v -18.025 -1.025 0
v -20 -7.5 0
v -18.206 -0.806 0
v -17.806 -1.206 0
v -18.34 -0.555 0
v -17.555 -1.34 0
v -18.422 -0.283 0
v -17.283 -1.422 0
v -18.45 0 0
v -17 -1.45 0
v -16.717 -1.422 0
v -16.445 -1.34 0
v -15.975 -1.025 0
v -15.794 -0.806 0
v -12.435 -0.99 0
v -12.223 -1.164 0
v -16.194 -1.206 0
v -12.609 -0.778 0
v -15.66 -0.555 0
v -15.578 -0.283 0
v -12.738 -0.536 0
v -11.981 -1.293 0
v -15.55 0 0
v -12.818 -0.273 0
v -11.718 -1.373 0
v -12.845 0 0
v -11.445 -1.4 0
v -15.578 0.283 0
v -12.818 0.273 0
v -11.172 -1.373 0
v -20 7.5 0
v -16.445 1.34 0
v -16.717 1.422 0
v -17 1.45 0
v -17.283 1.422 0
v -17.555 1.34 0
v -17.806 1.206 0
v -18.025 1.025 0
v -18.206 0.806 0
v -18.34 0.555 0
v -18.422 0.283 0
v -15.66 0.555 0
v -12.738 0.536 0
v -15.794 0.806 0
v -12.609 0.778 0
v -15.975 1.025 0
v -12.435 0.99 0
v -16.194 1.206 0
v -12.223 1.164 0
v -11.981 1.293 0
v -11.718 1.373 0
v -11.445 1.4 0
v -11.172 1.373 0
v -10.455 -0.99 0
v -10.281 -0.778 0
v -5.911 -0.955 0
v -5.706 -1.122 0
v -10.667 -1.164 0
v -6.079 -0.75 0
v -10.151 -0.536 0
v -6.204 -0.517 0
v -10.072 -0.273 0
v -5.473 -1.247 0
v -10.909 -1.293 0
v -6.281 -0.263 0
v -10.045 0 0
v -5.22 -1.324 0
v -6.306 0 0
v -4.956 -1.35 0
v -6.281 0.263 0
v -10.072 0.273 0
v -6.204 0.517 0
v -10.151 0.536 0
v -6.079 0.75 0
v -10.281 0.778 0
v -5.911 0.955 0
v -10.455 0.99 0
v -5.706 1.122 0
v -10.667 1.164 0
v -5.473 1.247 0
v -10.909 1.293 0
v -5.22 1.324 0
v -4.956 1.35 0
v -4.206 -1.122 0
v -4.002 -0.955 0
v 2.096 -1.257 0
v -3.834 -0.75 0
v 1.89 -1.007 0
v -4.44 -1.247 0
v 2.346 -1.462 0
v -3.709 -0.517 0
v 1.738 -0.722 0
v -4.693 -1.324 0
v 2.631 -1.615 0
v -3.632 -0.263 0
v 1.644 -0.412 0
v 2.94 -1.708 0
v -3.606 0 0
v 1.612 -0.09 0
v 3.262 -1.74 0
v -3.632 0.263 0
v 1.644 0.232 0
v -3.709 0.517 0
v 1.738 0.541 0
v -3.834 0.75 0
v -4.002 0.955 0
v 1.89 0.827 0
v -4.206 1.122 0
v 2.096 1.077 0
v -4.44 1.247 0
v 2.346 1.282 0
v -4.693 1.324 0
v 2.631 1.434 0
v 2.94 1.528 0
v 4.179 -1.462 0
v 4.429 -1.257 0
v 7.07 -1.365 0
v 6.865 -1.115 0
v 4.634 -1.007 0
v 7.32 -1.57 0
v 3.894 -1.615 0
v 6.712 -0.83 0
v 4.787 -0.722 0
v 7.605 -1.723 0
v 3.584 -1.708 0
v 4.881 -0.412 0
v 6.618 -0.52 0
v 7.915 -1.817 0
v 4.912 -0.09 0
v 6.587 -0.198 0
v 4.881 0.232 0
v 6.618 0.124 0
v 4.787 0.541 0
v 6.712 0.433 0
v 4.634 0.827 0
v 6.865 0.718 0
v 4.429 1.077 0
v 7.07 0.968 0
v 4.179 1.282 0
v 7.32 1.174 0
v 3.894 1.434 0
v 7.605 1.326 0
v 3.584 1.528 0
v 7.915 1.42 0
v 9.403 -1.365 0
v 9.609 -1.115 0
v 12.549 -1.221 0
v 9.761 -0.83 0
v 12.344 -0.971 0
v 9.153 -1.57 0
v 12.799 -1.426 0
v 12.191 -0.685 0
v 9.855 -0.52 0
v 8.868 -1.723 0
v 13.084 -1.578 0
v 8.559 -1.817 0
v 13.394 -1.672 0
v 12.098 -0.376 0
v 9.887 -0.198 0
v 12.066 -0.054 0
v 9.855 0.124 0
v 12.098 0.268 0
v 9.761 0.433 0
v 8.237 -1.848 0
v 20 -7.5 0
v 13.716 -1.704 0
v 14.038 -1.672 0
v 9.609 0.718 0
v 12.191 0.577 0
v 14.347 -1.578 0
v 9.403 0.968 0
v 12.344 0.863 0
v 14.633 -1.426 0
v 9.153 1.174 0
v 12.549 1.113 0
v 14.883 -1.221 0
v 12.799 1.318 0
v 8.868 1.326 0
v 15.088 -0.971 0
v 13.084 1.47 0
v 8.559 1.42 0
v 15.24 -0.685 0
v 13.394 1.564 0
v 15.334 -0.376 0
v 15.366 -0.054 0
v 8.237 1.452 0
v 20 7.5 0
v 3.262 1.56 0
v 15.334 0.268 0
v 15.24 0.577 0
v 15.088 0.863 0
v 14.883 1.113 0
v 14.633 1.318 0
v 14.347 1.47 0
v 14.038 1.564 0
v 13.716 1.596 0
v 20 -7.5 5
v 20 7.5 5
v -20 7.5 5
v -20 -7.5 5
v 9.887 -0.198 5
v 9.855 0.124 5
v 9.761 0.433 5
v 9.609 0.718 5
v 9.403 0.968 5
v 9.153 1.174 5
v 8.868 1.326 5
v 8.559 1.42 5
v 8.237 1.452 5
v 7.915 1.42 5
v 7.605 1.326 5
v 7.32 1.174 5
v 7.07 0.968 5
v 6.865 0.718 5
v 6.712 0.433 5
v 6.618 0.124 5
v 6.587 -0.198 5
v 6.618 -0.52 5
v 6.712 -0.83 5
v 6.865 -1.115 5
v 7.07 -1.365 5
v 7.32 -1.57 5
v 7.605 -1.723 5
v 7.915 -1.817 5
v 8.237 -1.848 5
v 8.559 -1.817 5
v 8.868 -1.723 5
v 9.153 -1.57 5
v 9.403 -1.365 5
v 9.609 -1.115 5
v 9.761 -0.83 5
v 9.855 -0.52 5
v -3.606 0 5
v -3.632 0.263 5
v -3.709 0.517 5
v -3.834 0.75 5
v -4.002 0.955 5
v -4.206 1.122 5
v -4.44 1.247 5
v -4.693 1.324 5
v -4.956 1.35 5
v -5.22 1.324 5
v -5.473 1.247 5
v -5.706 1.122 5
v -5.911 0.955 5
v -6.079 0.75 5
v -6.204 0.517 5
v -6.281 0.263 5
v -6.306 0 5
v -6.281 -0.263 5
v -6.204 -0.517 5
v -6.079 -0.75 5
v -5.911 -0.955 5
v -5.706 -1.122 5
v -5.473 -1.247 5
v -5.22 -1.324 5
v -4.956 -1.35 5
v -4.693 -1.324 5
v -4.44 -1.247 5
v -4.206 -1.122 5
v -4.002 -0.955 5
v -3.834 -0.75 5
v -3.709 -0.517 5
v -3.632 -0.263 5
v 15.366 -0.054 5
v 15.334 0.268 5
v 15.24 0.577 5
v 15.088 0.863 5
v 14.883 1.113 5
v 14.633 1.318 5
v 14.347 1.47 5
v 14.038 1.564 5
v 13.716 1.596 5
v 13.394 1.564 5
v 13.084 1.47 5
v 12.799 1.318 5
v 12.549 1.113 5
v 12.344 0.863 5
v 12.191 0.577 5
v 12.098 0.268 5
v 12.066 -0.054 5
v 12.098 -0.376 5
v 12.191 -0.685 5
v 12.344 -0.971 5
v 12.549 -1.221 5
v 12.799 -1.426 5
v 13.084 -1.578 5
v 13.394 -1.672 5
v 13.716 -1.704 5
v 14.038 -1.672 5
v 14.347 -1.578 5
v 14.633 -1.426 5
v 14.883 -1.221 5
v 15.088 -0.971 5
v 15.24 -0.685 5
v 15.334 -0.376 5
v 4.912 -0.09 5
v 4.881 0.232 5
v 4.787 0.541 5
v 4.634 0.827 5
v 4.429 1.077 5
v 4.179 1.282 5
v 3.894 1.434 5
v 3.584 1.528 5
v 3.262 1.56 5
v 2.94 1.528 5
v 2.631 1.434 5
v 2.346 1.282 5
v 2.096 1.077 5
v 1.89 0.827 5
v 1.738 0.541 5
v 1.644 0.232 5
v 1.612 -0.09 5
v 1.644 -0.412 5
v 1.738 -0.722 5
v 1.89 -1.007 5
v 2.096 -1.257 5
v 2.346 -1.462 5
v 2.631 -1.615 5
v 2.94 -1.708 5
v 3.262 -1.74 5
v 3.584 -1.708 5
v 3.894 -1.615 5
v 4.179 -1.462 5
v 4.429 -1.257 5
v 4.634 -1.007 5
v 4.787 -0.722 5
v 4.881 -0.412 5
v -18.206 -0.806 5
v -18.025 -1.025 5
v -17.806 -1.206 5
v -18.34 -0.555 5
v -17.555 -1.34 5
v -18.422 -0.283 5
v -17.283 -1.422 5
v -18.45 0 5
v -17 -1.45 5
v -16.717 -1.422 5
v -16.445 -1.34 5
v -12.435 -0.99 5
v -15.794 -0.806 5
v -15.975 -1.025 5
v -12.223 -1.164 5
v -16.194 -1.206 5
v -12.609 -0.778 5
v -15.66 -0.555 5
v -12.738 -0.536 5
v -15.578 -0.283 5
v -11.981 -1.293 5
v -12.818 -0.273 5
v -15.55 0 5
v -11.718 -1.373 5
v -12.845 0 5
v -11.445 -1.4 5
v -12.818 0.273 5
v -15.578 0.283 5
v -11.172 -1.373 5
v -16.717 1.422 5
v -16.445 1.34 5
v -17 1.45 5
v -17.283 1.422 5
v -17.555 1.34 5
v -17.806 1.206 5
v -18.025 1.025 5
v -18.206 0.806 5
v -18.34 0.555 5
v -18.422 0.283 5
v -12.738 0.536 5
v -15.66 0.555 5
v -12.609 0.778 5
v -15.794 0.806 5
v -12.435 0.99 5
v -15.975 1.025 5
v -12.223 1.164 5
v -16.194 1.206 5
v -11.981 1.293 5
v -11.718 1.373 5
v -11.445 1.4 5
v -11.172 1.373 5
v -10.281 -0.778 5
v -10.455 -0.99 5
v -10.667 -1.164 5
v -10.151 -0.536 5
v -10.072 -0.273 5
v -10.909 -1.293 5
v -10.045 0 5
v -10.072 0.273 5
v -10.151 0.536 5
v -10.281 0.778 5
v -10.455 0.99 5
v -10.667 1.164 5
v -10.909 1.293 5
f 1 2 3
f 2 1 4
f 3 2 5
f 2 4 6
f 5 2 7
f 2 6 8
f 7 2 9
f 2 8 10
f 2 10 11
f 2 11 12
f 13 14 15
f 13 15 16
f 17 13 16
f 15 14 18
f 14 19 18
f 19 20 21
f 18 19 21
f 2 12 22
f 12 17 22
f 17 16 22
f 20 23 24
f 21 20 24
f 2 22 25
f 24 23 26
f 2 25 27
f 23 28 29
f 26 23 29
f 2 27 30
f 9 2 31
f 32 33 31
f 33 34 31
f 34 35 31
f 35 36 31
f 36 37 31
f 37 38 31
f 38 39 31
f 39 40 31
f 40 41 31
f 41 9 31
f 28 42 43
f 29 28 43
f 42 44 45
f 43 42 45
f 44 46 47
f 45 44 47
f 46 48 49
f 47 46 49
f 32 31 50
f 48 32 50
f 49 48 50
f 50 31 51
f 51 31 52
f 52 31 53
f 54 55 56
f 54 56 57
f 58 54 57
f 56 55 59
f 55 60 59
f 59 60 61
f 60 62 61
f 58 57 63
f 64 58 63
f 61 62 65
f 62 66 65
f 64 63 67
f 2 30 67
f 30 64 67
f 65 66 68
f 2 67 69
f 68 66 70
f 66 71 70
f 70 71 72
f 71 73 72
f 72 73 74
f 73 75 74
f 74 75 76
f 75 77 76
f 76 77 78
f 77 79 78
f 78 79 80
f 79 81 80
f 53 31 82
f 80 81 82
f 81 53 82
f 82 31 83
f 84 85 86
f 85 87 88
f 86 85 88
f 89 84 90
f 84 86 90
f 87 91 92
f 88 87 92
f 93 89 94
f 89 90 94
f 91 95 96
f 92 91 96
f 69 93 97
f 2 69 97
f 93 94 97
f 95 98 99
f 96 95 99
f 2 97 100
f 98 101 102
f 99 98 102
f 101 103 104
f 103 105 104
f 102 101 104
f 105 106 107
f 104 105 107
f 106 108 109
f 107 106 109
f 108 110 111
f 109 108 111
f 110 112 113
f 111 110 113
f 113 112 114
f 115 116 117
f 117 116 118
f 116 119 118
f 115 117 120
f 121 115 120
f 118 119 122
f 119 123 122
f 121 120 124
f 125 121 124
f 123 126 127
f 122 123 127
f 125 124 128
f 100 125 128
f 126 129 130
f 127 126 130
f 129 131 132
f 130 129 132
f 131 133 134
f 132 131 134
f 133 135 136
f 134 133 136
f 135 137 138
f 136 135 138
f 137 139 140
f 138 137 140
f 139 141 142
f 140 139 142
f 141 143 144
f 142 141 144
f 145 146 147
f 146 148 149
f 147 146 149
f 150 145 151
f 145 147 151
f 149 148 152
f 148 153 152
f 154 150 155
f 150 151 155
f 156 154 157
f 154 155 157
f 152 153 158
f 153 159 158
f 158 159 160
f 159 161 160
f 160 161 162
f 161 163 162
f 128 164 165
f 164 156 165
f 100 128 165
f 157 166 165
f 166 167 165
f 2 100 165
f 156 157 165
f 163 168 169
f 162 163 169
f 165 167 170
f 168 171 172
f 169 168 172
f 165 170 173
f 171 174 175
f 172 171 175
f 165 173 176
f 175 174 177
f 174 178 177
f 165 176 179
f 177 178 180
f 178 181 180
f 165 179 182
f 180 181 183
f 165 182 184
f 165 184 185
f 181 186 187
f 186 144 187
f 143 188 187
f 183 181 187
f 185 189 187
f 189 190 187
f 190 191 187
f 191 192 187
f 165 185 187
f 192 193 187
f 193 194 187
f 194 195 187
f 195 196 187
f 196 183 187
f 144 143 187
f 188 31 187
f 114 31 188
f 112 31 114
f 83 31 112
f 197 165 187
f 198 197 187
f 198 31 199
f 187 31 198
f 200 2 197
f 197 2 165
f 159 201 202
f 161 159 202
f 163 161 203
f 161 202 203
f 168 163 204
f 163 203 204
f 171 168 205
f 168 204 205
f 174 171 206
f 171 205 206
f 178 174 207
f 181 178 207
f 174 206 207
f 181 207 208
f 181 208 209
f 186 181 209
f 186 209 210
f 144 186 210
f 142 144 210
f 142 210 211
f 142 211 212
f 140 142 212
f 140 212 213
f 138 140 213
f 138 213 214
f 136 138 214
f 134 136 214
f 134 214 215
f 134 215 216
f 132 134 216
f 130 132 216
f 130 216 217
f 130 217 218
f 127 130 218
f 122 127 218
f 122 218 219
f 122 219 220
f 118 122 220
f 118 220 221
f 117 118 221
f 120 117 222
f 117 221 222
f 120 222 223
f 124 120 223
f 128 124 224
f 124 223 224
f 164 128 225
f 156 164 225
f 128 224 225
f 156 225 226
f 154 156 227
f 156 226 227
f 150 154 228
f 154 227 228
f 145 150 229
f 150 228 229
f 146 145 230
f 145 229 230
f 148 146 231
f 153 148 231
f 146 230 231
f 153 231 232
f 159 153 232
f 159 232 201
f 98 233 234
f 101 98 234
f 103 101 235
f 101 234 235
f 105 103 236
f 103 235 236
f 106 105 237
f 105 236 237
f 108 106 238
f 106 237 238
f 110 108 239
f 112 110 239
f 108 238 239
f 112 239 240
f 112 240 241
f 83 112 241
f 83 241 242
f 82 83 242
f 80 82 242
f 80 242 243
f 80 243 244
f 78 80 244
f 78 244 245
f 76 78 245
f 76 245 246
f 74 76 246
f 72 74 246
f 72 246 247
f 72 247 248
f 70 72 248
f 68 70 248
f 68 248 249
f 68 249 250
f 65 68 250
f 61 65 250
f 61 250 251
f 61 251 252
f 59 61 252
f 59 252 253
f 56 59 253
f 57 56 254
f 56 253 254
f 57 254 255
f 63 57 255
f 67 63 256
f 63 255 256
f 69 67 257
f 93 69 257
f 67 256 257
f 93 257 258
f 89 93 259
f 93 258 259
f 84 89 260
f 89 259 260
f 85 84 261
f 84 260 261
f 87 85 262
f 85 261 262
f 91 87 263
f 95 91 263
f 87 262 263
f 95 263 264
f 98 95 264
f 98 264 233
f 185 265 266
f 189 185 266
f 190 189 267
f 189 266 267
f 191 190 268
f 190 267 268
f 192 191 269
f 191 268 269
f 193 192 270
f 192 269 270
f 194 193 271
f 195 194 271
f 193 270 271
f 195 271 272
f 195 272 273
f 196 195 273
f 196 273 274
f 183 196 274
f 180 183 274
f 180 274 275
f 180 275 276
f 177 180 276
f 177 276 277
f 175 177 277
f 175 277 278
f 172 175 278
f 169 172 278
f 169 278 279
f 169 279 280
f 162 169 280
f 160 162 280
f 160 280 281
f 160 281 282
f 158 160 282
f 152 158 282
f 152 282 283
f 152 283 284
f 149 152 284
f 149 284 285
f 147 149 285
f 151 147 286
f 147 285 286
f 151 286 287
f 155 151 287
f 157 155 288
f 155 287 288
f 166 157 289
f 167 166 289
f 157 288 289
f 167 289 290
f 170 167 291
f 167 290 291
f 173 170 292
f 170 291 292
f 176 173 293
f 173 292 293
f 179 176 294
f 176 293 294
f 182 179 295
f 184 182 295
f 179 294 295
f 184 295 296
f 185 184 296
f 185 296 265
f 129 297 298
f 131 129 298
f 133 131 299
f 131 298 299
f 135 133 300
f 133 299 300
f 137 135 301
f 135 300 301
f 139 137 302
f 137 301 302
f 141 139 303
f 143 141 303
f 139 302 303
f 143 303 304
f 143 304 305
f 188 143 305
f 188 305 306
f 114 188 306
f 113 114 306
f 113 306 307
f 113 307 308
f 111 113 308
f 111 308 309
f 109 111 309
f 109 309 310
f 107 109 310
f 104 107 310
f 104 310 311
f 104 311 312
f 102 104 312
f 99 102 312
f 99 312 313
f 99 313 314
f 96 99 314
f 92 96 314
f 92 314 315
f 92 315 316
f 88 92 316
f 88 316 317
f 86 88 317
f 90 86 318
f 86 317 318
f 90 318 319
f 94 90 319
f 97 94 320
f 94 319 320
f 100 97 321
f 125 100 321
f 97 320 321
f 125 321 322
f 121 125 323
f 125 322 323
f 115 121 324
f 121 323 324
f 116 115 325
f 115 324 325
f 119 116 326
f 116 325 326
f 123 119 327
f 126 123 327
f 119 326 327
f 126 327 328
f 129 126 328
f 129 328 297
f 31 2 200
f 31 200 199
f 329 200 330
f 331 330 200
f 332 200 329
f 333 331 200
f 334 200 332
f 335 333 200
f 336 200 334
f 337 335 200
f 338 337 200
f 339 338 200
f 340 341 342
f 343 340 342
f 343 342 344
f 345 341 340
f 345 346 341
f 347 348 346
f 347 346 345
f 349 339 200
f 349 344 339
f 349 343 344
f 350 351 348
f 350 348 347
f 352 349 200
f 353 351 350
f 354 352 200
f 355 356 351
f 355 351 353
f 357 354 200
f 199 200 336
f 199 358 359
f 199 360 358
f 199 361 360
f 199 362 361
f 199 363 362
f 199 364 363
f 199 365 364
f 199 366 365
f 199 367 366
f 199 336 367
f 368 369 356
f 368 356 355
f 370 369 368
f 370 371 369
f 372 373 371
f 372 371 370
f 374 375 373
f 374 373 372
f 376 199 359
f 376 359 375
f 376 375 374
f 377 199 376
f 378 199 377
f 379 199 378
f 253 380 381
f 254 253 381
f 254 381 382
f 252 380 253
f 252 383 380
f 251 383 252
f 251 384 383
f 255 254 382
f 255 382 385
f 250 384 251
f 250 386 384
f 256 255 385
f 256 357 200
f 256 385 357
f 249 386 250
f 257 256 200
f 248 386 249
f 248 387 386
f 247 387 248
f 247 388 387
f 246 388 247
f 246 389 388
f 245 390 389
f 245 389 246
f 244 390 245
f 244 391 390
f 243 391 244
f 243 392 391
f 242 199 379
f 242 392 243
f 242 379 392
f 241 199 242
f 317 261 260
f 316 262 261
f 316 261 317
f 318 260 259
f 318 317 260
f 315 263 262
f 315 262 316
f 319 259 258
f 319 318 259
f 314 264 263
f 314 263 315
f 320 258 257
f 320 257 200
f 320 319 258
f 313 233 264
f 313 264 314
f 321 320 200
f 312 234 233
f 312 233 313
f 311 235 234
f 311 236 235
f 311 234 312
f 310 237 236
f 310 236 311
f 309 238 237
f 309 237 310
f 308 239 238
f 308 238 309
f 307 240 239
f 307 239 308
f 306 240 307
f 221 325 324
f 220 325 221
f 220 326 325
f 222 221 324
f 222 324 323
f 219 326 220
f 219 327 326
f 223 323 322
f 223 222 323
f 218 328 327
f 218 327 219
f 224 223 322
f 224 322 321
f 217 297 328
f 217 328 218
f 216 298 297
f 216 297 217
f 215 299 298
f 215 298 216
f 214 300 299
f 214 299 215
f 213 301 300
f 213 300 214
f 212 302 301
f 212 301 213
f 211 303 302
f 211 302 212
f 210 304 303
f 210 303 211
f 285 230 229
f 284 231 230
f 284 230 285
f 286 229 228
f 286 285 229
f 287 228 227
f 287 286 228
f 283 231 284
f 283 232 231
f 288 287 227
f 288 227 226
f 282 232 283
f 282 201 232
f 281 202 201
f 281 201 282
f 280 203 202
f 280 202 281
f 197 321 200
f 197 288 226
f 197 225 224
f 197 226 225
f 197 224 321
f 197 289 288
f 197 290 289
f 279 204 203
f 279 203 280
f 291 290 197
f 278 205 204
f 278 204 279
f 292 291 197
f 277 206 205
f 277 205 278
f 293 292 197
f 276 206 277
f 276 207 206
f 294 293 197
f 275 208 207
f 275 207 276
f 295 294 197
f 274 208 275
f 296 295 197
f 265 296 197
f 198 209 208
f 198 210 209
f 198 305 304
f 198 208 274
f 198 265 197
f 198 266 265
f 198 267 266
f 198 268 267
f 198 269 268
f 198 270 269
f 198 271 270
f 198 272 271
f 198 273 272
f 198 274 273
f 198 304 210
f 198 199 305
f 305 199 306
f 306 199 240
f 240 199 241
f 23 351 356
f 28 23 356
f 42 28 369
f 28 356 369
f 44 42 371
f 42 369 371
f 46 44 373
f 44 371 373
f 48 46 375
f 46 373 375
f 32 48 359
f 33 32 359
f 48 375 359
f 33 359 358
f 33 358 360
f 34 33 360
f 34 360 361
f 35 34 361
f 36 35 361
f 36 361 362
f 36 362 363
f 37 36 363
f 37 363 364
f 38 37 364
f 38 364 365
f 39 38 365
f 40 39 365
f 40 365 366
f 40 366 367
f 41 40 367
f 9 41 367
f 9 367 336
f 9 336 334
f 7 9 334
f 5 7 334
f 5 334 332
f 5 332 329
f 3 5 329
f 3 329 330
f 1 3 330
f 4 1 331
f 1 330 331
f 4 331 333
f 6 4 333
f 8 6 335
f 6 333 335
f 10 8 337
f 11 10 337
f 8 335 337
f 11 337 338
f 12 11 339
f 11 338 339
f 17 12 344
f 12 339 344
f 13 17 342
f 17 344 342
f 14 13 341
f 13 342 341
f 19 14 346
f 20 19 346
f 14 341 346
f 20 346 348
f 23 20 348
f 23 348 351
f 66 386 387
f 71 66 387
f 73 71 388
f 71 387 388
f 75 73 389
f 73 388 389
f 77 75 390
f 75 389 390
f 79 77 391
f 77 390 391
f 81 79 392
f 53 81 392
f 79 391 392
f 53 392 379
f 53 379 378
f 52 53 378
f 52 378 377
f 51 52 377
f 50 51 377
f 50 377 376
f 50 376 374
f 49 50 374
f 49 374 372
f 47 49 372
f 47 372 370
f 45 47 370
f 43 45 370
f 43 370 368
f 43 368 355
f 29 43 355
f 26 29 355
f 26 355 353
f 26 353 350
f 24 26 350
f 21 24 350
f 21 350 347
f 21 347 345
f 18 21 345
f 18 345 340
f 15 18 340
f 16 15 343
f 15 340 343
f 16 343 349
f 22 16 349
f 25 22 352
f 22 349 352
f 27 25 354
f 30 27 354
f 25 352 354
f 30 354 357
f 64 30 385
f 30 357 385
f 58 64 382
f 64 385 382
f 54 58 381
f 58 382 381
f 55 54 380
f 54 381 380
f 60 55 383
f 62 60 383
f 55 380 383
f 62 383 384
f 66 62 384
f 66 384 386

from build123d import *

# Parameters (mm, degrees)
SKETCH_W      = 40
SKETCH_H      = 15
PAD_DEPTH     = 5
SKETCH001_R   = 1.45
SKETCH001_R_2 = 1.4
SKETCH001_R_3 = 1.35
POCKET_DEPTH  = 20
SKETCH002_R   = 1.65
HOLE_DEPTH    = 25


with BuildPart() as part:
    # Sketch → Pad (new body)
    with BuildSketch(Plane.XY):
        Rectangle(SKETCH_W, SKETCH_H)
    extrude(amount=PAD_DEPTH)

    # Sketch001 (on Face6 of Pad) → Pocket (cut)
    with BuildSketch(Plane.XY.offset(5)):
        with Locations((-17, 0)):
            Circle(SKETCH001_R)
        with Locations((-11.444874, 0)):
            Circle(SKETCH001_R_2)
        with Locations((-4.956441, 0)):
            Circle(SKETCH001_R_3)
    extrude(amount=-POCKET_DEPTH, mode=Mode.SUBTRACT)

    # Sketch002 (on Face5 of Pocket) → Hole (cut)
    with BuildSketch(Plane.XY.offset(5)):
        with Locations((3.262239, -0.090117)):
            Circle(SKETCH002_R)
        with Locations((8.236705, -0.198258)):
            Circle(SKETCH002_R)
        with Locations((13.715827, -0.05407)):
            Circle(SKETCH002_R)
    extrude(amount=-HOLE_DEPTH, mode=Mode.SUBTRACT)


solid = part.part
